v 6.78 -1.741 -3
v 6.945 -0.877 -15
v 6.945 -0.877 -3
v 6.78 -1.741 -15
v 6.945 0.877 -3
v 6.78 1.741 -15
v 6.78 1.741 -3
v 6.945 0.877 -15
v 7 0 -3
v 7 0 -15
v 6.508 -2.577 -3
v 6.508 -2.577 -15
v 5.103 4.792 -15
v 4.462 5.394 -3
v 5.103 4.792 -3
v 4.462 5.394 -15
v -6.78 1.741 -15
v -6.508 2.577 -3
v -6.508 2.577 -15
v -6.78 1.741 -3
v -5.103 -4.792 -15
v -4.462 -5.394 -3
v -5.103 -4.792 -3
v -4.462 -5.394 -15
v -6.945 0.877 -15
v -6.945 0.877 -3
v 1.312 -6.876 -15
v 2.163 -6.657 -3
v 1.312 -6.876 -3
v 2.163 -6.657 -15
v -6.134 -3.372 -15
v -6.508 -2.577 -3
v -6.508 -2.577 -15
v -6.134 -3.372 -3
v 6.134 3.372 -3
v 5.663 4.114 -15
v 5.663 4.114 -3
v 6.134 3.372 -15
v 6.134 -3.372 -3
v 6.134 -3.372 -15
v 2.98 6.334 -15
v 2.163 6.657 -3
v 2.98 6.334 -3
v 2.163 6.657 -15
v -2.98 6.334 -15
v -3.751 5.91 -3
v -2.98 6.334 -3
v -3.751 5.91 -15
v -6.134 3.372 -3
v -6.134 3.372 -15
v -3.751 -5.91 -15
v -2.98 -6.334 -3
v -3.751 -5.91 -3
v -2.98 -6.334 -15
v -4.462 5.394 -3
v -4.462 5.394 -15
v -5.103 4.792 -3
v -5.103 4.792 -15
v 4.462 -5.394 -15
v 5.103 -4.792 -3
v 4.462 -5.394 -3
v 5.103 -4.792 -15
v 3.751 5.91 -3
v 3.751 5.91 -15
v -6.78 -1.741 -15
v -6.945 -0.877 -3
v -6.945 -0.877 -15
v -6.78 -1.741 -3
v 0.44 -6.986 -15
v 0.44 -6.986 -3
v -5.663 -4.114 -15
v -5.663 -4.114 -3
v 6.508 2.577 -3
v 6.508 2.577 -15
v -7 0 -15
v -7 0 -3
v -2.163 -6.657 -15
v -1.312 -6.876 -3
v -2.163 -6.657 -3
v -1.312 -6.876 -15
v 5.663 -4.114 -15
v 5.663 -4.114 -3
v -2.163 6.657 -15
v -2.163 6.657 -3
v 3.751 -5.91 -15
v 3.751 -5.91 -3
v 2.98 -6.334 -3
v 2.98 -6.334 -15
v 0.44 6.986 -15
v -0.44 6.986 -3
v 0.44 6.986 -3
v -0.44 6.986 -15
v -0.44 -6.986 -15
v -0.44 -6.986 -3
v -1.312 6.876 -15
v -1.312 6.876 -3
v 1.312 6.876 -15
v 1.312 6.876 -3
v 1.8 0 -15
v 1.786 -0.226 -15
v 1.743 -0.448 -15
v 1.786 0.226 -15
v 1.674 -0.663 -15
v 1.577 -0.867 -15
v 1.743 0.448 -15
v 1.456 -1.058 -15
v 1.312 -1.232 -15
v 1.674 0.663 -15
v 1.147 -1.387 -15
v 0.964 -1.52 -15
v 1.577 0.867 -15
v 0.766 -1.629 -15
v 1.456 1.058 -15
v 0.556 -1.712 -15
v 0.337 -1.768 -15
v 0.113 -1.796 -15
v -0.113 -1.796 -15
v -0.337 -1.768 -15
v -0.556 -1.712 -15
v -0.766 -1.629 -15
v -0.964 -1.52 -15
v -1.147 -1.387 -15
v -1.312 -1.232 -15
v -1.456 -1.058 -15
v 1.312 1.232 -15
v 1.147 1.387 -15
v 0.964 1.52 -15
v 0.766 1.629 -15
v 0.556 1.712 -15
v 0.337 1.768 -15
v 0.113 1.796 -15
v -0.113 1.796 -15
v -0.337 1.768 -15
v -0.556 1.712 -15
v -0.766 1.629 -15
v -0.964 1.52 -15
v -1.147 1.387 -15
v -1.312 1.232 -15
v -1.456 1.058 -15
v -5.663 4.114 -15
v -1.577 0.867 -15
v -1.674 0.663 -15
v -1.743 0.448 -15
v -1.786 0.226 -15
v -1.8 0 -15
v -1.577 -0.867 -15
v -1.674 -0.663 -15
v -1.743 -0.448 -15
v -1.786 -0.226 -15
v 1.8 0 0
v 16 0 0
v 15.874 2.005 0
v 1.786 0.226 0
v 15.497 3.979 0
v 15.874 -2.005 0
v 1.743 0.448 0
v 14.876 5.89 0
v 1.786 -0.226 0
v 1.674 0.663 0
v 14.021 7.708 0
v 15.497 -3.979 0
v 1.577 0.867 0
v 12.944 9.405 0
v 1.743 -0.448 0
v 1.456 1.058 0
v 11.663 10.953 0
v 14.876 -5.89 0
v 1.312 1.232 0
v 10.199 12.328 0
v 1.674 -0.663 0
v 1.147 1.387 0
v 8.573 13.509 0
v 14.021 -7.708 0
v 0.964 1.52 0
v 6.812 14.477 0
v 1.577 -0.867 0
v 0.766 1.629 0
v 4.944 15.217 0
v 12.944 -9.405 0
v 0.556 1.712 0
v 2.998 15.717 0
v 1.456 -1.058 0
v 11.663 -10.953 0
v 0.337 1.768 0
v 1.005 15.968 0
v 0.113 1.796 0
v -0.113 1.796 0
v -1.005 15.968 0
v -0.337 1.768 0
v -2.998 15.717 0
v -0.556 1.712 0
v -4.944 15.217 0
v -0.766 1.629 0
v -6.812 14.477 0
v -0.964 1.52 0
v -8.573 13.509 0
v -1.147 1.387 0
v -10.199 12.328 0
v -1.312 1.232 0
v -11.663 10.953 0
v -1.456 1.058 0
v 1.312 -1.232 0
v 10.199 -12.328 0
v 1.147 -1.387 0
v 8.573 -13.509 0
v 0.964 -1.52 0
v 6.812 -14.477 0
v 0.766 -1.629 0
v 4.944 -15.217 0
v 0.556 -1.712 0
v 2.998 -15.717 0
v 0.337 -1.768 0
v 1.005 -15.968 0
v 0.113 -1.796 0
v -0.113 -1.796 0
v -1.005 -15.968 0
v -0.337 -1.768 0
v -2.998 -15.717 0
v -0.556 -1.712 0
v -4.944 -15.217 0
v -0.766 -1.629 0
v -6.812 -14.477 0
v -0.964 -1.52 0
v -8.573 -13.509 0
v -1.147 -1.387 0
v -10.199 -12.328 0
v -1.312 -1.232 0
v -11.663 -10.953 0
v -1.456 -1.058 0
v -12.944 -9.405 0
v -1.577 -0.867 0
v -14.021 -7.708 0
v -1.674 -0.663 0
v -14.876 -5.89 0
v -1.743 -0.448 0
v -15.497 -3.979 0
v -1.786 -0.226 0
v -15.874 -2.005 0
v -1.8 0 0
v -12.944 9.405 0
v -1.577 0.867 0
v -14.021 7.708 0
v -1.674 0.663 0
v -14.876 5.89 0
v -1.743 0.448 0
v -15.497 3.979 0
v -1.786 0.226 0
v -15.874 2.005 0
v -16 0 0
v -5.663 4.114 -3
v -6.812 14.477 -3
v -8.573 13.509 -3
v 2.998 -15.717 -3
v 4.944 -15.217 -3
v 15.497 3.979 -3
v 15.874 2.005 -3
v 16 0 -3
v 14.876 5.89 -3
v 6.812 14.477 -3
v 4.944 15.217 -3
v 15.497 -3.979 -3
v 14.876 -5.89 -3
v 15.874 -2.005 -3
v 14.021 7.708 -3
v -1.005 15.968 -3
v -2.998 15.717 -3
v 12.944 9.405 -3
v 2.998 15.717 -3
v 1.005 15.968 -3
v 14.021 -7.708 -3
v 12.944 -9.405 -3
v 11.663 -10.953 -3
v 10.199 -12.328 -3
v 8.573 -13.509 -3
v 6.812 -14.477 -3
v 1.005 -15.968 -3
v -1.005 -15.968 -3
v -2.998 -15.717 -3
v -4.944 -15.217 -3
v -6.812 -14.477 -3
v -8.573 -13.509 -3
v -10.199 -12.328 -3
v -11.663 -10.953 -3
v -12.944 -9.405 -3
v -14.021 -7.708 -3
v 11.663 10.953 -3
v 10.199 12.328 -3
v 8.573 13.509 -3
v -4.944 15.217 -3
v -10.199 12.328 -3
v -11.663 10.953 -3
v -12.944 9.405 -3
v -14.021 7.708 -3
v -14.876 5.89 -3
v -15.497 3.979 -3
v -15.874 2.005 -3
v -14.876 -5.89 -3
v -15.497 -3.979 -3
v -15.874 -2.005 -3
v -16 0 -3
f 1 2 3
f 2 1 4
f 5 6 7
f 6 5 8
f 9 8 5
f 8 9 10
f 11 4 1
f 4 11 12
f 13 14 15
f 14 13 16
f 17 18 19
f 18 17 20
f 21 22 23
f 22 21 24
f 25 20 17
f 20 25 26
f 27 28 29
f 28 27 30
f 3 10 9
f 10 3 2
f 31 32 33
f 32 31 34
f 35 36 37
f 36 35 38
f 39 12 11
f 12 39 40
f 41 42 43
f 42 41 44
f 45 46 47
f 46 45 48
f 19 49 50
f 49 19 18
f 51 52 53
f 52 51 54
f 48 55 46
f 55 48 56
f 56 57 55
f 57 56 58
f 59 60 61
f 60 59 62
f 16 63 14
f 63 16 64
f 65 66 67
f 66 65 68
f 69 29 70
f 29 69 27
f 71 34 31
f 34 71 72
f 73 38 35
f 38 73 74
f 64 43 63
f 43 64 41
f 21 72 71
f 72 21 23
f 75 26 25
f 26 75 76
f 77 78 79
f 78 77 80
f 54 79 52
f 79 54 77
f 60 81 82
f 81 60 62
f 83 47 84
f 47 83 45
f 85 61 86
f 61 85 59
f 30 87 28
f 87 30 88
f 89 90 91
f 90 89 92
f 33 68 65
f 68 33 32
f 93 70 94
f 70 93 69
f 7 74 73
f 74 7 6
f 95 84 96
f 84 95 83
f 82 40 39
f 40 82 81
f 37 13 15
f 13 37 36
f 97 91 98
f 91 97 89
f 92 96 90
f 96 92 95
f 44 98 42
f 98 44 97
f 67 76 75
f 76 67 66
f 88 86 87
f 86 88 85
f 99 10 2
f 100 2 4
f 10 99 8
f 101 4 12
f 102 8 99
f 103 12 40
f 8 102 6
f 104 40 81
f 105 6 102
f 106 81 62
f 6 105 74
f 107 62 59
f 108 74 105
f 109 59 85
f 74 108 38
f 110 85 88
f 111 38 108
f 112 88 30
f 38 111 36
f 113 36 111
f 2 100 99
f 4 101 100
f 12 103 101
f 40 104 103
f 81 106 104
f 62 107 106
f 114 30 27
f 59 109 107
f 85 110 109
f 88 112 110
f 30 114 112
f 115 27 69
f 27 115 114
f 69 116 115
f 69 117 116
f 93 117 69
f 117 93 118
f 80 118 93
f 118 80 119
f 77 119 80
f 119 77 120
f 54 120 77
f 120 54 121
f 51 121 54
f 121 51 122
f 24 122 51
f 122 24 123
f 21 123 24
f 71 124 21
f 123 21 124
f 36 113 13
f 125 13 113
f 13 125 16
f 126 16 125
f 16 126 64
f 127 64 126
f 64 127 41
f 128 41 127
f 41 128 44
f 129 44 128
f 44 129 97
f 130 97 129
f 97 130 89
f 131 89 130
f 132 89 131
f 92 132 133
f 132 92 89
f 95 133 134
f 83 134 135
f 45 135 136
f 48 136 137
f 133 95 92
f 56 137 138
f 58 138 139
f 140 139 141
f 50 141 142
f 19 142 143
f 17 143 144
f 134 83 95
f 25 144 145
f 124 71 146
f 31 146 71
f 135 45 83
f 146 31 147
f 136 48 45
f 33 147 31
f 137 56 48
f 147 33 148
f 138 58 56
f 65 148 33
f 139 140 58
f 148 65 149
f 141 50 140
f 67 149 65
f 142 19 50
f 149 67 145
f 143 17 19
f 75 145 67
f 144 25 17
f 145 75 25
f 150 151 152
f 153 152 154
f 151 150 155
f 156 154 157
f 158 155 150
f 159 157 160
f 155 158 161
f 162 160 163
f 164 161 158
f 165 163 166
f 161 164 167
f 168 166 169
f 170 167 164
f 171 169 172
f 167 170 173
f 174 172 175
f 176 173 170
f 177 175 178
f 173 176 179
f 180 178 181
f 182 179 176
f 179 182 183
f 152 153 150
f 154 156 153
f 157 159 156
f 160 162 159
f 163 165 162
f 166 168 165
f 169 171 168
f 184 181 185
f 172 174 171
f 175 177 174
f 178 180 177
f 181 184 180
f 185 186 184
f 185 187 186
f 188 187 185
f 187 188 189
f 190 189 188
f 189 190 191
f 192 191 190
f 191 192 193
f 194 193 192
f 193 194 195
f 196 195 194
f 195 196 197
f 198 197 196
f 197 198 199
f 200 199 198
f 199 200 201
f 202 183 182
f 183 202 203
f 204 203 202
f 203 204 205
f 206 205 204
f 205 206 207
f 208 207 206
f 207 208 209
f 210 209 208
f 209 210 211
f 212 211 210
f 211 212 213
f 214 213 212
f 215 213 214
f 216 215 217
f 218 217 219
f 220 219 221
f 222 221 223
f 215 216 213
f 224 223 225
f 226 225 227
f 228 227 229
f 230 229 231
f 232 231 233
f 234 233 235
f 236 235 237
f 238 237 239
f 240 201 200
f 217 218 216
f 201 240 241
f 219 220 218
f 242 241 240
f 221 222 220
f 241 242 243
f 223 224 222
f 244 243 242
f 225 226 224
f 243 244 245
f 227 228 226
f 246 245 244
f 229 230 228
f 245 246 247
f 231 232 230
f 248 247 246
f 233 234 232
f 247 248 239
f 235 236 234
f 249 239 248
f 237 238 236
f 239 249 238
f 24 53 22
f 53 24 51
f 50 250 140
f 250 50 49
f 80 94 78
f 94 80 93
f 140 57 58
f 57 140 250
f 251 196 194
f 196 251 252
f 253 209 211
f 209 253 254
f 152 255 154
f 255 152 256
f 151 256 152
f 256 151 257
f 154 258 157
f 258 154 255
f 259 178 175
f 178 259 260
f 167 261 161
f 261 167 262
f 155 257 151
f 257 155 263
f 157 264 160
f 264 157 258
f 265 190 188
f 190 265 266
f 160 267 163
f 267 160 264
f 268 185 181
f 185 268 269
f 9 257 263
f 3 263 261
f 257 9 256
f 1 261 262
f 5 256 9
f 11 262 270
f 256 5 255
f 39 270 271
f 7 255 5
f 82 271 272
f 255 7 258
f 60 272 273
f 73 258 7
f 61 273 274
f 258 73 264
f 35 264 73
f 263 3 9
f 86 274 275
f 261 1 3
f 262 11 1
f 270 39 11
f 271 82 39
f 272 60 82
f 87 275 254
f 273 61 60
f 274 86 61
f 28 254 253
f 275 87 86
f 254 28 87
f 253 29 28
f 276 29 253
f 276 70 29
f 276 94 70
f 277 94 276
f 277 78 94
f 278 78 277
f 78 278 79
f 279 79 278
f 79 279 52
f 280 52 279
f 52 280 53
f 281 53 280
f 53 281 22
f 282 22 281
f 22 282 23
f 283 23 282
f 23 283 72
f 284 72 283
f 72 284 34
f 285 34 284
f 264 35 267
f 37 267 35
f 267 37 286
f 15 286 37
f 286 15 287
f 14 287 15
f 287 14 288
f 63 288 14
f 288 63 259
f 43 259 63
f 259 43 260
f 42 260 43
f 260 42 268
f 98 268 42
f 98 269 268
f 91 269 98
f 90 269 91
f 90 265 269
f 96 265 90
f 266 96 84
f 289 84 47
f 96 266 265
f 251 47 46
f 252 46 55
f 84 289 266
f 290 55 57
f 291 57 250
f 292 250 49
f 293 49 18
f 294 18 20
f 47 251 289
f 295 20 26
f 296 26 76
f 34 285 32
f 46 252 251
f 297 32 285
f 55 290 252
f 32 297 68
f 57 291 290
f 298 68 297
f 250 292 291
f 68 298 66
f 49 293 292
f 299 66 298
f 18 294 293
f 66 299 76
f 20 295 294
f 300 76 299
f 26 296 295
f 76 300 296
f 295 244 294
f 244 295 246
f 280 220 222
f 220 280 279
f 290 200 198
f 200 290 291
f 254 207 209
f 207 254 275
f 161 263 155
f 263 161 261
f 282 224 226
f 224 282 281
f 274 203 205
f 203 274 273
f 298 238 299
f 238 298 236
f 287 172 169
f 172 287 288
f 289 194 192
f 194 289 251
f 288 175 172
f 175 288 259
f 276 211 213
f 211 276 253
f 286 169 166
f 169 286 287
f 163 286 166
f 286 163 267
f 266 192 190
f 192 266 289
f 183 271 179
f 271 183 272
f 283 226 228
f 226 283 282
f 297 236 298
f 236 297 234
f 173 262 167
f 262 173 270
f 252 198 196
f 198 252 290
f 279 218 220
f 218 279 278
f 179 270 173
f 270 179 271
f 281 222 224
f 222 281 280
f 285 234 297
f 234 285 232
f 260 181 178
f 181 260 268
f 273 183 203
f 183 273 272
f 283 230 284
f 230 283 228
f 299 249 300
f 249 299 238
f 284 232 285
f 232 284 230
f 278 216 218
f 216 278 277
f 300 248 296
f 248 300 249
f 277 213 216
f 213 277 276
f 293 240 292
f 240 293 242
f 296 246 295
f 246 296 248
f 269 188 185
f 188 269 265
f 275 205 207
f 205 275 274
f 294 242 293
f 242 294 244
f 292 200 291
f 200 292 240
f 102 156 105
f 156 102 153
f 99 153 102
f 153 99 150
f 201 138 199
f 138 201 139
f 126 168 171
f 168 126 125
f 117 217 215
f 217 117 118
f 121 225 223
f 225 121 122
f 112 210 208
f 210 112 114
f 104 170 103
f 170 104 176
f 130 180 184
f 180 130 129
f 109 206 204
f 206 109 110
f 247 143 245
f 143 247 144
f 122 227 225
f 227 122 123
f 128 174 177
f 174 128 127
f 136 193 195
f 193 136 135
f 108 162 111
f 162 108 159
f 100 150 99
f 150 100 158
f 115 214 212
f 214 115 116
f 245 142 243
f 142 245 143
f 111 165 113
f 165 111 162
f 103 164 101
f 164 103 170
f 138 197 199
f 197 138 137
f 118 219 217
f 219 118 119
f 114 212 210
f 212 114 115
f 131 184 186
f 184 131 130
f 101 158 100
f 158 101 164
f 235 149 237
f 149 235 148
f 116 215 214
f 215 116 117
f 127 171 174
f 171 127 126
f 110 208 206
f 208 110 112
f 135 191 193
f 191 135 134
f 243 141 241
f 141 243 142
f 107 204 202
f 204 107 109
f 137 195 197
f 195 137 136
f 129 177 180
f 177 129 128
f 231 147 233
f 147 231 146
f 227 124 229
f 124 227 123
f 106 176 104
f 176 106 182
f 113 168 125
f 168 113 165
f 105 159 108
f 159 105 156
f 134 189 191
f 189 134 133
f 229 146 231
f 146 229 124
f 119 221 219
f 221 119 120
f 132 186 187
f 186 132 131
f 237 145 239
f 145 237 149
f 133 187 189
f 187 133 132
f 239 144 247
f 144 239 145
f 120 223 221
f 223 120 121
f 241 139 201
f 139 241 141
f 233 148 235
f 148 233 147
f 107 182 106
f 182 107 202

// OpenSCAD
$fn = 50;


difference() {
	union() {
		translate(v = [0, 0, -15.0000000000]) {
			cylinder(h = 15, r = 7.0000000000);
		}
		translate(v = [0, 0, -3.0000000000]) {
			cylinder(h = 3, r = 16.0000000000);
		}
	}
	union() {
		#translate(v = [0, 0, -15]) {
			cylinder(h = 15, r = 1.8000000000);
		}
	}
}
